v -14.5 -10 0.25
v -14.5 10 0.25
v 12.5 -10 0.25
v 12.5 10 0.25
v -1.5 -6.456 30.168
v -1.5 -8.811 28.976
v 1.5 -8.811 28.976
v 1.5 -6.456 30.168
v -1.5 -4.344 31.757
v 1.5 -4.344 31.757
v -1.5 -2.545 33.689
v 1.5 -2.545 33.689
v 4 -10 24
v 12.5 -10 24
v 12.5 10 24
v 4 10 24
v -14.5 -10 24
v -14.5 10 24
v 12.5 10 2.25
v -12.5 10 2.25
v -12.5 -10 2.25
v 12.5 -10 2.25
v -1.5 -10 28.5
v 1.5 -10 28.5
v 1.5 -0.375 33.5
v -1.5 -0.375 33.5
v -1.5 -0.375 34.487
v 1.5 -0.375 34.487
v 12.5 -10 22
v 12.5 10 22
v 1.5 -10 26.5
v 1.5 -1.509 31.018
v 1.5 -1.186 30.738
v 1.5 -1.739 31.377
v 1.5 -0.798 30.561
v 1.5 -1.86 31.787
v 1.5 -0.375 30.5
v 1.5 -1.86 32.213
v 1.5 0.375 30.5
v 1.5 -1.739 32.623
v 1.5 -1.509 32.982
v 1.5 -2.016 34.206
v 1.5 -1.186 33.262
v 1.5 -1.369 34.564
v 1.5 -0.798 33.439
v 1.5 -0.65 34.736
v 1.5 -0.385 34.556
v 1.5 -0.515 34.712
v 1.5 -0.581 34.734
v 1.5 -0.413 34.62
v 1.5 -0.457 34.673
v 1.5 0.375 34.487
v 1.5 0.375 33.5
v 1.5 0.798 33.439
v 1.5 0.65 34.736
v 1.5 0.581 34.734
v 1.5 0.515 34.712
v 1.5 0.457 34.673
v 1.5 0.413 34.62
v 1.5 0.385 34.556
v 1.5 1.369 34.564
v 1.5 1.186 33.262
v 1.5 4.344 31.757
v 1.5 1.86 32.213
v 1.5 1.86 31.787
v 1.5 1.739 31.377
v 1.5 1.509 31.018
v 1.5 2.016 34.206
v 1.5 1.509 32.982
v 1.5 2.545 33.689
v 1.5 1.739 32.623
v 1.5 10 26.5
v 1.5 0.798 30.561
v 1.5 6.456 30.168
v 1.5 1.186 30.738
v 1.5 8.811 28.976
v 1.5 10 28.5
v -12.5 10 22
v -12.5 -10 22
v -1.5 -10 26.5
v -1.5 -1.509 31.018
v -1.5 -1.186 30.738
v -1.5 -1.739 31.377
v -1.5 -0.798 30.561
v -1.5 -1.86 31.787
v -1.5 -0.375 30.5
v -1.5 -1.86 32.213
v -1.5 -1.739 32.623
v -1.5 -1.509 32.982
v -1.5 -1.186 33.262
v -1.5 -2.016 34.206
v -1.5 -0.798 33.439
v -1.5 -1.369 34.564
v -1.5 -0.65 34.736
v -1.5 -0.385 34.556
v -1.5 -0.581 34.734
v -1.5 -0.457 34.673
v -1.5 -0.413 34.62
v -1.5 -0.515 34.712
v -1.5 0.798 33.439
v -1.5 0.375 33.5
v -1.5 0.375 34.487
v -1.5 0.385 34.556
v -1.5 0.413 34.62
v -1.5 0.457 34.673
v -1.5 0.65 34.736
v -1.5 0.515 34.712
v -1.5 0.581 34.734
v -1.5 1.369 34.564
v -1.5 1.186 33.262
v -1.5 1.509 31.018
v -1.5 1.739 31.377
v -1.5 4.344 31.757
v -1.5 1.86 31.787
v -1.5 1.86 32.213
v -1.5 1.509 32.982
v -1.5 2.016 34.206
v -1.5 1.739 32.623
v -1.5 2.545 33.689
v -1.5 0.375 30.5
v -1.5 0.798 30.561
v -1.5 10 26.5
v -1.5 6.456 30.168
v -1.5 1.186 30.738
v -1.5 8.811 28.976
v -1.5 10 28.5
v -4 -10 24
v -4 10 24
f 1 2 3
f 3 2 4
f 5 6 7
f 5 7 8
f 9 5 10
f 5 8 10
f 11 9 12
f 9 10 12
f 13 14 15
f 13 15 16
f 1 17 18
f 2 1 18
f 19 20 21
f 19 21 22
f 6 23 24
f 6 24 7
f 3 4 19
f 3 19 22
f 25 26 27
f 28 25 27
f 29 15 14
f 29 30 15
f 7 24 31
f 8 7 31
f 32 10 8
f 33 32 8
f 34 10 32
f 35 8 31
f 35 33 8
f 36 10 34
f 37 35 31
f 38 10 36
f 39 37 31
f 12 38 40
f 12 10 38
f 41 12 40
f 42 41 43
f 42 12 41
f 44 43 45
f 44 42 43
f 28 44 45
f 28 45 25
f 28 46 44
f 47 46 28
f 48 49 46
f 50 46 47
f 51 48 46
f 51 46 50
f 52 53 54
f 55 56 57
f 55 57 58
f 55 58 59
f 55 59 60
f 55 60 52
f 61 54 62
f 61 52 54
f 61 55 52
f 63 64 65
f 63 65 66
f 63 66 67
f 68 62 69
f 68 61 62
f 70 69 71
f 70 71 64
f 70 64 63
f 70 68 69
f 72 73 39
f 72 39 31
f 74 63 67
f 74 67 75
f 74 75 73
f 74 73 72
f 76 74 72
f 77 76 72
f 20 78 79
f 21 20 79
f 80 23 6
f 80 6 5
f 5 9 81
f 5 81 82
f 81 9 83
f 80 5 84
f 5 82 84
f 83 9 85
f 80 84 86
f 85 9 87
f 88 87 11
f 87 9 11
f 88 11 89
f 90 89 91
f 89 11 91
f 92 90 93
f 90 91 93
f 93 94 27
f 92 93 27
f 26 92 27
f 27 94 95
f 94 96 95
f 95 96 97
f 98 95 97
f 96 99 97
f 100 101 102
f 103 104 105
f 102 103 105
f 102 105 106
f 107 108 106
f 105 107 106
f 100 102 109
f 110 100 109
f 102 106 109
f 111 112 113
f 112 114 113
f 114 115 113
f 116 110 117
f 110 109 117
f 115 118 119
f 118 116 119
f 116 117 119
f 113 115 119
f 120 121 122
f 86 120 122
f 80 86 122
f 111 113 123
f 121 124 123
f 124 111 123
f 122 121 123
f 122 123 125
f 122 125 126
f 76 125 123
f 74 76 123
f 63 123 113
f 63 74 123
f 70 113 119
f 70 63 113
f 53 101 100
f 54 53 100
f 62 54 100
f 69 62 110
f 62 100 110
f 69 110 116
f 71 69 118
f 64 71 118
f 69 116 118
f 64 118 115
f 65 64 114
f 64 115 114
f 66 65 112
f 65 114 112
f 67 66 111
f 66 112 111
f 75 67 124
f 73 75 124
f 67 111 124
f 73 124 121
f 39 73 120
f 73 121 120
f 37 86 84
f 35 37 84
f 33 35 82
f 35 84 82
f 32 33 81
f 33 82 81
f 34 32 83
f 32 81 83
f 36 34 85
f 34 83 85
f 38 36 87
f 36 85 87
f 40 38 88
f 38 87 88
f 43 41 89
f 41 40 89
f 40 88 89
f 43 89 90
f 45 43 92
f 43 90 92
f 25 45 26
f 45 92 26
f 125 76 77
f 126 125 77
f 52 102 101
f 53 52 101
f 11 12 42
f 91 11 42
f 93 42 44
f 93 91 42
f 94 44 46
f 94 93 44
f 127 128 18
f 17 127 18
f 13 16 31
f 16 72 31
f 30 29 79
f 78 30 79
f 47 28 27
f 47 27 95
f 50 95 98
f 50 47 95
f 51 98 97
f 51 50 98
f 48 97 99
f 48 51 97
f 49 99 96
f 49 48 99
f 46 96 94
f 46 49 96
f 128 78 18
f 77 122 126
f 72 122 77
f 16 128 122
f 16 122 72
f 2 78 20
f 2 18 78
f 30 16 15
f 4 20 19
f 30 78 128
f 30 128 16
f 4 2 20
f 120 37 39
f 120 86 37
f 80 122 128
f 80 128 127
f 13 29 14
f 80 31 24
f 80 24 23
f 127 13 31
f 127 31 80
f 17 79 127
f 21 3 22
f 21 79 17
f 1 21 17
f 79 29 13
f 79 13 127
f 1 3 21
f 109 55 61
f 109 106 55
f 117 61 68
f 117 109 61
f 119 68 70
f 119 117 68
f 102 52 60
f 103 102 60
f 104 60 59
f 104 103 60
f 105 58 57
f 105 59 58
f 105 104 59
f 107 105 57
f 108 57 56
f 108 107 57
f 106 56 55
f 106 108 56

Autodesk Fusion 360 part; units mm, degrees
sketch "Sketch1" plane through (0, 0, 0) normal (0, 0, 1) x (1, 0, 0)
  line L0 (-12.5, 10) -> (12.5, 10)
  line L1 (12.5, 10) -> (12.5, -10)
  line L2 (12.5, -10) -> (-12.5, -10)
  line L3 (-12.5, -10) -> (-12.5, 10)
  dimension "d1" = 25
  dimension "d2" = 12.5
  dimension "d3" = 20
  dimension "d4" = 10
extrude "Extrude1" add sketch "Sketch1" along normal blind 2
sketch "Sketch2" plane through (0, 0, 2) normal (0, 0, 1) x (-1, 0, 0)
  line L0 (12.5, 10) -> (-12.5, 10)
  line L1 (-12.5, 10) -> (-12.5, -10)
  line L2 (-12.5, -10) -> (12.5, -10)
  line L3 (12.5, -10) -> (12.5, 10)
  line L4 (12.5, 10) -> (14.5, 10)
  line L5 (14.5, 10) -> (14.5, -10)
  line L6 (14.5, -10) -> (12.5, -10)
  line L7 (12.5, -10) -> (12.5, 10)
  dimension "d7" = 2
extrude "Extrude2" add sketch "Sketch2" along normal blind -2 and the other way blind -20 contours L3 L4 L5 L6 L7
sketch "Sketch3" plane through (0, 0, 22) normal (0, 0, 1) x (-1, 0, 0)
  line L0 (12.5, -10) -> (14.5, -10)
  line L1 (14.5, -10) -> (14.5, 10)
  line L2 (14.5, 10) -> (12.5, 10)
  line L3 (12.5, 10) -> (12.5, -10)
  line L4 (14.5, -10) -> (-12.5, -10)
  line L5 (-12.5, -10) -> (-12.5, 10)
  line L6 (-12.5, 10) -> (14.5, 10)
  line L7 (14.5, 10) -> (14.5, -10)
  point P0 (-12.5, 10)
  dimension "d12" = 27
extrude "Extrude3" add sketch "Sketch3" along normal blind 2
ref_plane "WorkPlane1" through (0, 0, 23) normal (1, 0, 0) x (0, 1, 0)
sketch "Sketch8" plane through (0, 0, 0) normal (1, 0, 0) x (0, 1, 0)
  line L0 (-0.375, 37.553) -> (0.375, 37.553)
  line L1 (-9.7103, 24) -> (10, 24)
  circle A0 centre (-0.375, 32) radius 2.75
  circle A1 centre (0.375, 32) radius 2.75
  line L2 (0.375, 37.553) -> (0.375, 32)
  circle A2 centre (0.375, 32) radius 1.5
  line L3 (0.375, 32) -> (0.375, 24)
  circle A3 centre (-0.375, 32) radius 1.5
  line L4 (-0.375, 32) -> (-0.375, 24)
  line L5 (-0.375, 32) -> (-0.375, 37.553)
  line L6 (10, 24) -> (-10, 24)
  line L7 (-10, 24) -> (-10, 28.5)
  line L8 (-10, 28.5) -> (10, 28.5)
  line L9 (10, 28.5) -> (10, 24)
  line L10 (-5, 30.5) -> (5, 30.5)
  line L11 (-10, 28.5) -> (-5, 30.5)
  line L12 (5, 30.5) -> (10, 28.5)
  point P0 (-9.7103, 23.053)
  point P1 (0, 22)
  point P2 (10, 23.053)
  point P3 (10, 24)
  point P4 (-10, 24)
  dimension "d73" = 5.5
  dimension "d74" = 5.5
  dimension "d75" = 10
  dimension "d76" = 0.75
  dimension "d77" = 0.375
  dimension "d78" = 3
  dimension "d79" = 3
  dimension "d80" = 2
  dimension "d93" = 3.5
  dimension "d101" = 1.5
  dimension "d102" = 10
  dimension "d103" = 5
extrude "Extrude11" add 1 faces at (-4.1667, 3.3333, 2) along direction (0, 0, 1) blind 0.25
extrude "Extrude12" cut 1 faces at (-5.5, -3.3333, 0) along direction (0, 0, 1) blind 0.25
extrude "Extrude14" add sketch "Sketch8" along normal mid plane 3 contours A0 A1 L5 L10 | A0 A1 L2 L10 | A0 A1 L4 L10 | A0 L4 L8 L10 L11 | A1 A3 L5 L10 | A0 L2 A2 L10 | A0 A1 L4 | A0 A1 L3 L4 L8 | A1 L4 L10 | A1 L3 L8 L10 L12 | A0 A1 L3 L10 | A0 A1 L3 L4 L10 | A0 A1 L3 | L1 L3 L4 L6 L8 | L1 L4 L6 L7 L8 | A0 L3 L10 | L1 L3 L6 L8 L9
chamfer "Chamfer2" distance 2.5 angle 45 2 edges at (1.5, 0, 24) (-1.5, 0, 24)
fillet "Fillet16" radius 15 2 edges at (0, -2.6799, 30.5) (0, 2.6799, 30.5)
fillet "Fillet16" radius 0.25 2 edges at (0, 0.375, 34.75) (0, -0.375, 34.75)
fillet "Fillet16" radius 2 2 edges at (0, -5, 30.5) (0, 5, 30.5)
equation "d77 = ( 0.75 / 2 ) * 1 mm"
